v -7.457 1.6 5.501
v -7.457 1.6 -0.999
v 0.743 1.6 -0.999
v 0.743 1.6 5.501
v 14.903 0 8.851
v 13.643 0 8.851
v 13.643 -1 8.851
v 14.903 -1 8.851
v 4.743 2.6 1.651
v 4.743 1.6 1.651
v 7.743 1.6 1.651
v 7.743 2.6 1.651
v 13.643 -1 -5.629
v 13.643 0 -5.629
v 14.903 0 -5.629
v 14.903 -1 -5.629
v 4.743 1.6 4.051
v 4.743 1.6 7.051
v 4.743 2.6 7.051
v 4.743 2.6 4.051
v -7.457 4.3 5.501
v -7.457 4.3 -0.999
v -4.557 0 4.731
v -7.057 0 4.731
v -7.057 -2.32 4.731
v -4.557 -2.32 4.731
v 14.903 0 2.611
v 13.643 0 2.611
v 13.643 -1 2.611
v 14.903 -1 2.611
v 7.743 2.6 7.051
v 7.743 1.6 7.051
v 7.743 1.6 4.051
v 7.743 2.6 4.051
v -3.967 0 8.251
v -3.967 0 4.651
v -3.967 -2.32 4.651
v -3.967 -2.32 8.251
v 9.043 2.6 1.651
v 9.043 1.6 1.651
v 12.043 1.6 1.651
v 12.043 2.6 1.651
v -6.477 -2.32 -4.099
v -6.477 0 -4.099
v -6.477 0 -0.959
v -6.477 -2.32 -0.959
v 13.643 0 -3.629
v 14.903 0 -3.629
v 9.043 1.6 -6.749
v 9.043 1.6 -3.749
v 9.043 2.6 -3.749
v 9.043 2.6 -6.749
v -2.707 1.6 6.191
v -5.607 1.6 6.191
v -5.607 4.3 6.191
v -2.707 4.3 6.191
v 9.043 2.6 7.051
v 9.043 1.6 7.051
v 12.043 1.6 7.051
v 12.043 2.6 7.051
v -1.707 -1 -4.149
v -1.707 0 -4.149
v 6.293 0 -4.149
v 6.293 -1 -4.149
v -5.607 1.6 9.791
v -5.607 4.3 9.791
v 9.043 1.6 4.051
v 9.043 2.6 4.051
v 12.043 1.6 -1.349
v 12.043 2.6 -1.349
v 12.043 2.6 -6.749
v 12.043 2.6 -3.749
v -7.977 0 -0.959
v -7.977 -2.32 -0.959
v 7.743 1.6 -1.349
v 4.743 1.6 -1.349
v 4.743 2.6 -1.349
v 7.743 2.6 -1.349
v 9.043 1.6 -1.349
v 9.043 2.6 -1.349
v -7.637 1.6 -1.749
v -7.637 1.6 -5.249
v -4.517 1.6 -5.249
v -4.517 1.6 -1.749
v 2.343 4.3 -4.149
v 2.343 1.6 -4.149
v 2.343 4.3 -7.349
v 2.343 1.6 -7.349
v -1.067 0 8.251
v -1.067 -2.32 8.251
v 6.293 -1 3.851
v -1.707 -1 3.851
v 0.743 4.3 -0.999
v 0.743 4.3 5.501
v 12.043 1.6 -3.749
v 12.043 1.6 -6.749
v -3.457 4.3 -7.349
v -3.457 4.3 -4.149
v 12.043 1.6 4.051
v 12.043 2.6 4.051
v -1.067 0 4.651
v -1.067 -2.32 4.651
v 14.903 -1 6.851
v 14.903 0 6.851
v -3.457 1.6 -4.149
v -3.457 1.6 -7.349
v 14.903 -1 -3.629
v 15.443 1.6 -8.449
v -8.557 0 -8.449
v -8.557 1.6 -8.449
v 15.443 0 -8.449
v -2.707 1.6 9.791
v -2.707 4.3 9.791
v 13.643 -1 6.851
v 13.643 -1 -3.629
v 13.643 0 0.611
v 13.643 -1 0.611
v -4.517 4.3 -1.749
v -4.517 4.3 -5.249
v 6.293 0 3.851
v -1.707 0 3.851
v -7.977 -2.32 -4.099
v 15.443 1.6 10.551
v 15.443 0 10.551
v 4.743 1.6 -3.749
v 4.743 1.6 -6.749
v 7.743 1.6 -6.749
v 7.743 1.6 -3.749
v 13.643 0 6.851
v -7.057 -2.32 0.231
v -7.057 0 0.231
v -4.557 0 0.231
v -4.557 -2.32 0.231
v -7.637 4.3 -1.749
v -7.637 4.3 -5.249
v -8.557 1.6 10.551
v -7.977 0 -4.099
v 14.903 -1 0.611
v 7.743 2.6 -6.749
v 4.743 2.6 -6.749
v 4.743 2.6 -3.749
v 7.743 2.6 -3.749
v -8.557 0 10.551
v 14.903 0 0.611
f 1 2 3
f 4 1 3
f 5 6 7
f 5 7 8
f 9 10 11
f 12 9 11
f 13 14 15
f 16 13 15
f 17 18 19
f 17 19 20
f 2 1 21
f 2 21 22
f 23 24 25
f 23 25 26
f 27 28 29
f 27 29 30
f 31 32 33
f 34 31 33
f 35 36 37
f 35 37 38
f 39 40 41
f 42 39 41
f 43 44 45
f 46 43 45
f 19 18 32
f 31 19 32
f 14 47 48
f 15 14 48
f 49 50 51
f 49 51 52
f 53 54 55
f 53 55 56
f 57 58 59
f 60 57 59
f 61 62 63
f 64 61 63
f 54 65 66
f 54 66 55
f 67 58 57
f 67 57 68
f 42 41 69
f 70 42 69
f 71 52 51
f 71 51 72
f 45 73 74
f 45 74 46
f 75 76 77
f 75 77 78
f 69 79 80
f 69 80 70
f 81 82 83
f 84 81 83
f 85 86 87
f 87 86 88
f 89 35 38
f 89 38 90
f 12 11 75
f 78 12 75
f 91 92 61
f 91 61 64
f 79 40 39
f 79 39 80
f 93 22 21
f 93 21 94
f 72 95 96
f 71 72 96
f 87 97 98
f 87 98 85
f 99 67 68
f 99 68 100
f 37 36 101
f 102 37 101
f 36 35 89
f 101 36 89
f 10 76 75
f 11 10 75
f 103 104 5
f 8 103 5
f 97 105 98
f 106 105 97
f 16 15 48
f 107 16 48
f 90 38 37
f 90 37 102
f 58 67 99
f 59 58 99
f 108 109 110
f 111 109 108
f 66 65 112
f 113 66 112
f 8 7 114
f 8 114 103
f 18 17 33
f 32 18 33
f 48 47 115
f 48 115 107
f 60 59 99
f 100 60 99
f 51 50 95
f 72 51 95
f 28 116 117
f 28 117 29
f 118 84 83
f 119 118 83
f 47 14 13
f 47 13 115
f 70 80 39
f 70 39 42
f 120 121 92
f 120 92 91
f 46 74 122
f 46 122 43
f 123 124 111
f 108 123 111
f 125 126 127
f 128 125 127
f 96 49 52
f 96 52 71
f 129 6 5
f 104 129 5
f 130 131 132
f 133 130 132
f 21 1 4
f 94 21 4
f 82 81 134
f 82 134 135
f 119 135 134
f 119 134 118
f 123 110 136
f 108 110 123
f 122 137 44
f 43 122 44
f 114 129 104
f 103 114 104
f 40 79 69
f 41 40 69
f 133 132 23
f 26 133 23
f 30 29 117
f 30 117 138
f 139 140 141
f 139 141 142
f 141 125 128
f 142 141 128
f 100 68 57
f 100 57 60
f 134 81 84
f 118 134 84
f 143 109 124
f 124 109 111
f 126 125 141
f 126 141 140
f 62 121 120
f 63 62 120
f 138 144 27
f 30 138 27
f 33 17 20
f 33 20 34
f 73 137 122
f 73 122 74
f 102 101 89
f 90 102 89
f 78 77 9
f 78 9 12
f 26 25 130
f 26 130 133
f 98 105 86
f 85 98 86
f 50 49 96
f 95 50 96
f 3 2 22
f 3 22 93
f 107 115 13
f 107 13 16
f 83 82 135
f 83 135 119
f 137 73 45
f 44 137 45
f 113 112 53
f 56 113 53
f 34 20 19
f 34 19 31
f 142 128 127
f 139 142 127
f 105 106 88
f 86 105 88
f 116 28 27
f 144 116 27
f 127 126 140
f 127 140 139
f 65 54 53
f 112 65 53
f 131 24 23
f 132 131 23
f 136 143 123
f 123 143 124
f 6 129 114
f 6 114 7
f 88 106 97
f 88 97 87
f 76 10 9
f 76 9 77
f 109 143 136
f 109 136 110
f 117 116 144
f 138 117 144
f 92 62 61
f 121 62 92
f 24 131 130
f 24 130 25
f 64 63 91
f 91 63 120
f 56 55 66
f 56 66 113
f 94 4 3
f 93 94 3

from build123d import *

# Parameters (mm, degrees)
SKETCH1_W             = 24
SKETCH1_H             = 19
BOSS_EXTRUDE1_DEPTH   = 1.6
SKETCH2_W             = 8.2
SKETCH2_H             = 6.5
BOSS_EXTRUDE2_DEPTH   = 2.7
SKETCH2_W_2           = 2.9
SKETCH2_H_2           = 3.6
BOSS_EXTRUDE2_2_DEPTH = 2.7
SKETCH2_W_3           = 5.8
SKETCH2_H_3           = 3.2
BOSS_EXTRUDE2_3_DEPTH = 2.7
SKETCH2_W_4           = 3.12
SKETCH2_H_4           = 3.5
BOSS_EXTRUDE2_4_DEPTH = 2.7
SKETCH3_W             = 3
SKETCH3_H             = 3
BOSS_EXTRUDE3_DEPTH   = 1
BOSS_EXTRUDE3_2_DEPTH = 1
BOSS_EXTRUDE3_3_DEPTH = 1
BOSS_EXTRUDE3_4_DEPTH = 1
BOSS_EXTRUDE3_5_DEPTH = 1
BOSS_EXTRUDE3_6_DEPTH = 1
SKETCH4_W             = 2.9
SKETCH4_H             = 3.6
BOSS_EXTRUDE4_DEPTH   = 2.32
SKETCH4_W_2           = 2.5
SKETCH4_H_2           = 4.5
BOSS_EXTRUDE4_2_DEPTH = 2.32
SKETCH4_W_3           = 1.5
SKETCH4_H_3           = 3.14
BOSS_EXTRUDE4_3_DEPTH = 2.32
SKETCH5_W             = 8
SKETCH5_H             = 8
BOSS_EXTRUDE5_DEPTH   = 1
SKETCH5_W_2           = 1.26
SKETCH5_H_2           = 2
BOSS_EXTRUDE5_2_DEPTH = 1
BOSS_EXTRUDE5_3_DEPTH = 1
BOSS_EXTRUDE5_4_DEPTH = 1


with BuildPart() as part:
    # Sketch1 → Boss-Extrude1 (new body)
    with BuildSketch(Plane(origin=(0, 0, 0), x_dir=(1, 0, 0), z_dir=(0, 1, 0))):
        with Locations((3.442553191, -1.05106383)):
            Rectangle(SKETCH1_W, SKETCH1_H)
    extrude(amount=BOSS_EXTRUDE1_DEPTH)


with BuildPart() as body_2:
    # Sketch2 → Boss-Extrude2 (new body)
    with BuildSketch(Plane(origin=(0, 1.6, 0), x_dir=(1, 0, 0), z_dir=(0, 1, 0))):
        with Locations((-3.357446809, -2.25106383)):
            Rectangle(SKETCH2_W, SKETCH2_H)
    extrude(amount=BOSS_EXTRUDE2_DEPTH)


with BuildPart() as body_3:
    # Sketch2 → Boss-Extrude2 2 (new body)
    with BuildSketch(Plane(origin=(0, 1.6, 0), x_dir=(1, 0, 0), z_dir=(0, 1, 0))):
        with Locations((-4.157446809, -7.99106383)):
            Rectangle(SKETCH2_W_2, SKETCH2_H_2)
    extrude(amount=BOSS_EXTRUDE2_2_DEPTH)


with BuildPart() as body_4:
    # Sketch2 → Boss-Extrude2 3 (new body)
    with BuildSketch(Plane(origin=(0, 1.6, 0), x_dir=(1, 0, 0), z_dir=(0, 1, 0))):
        with Locations((-0.557446809, 5.74893617)):
            Rectangle(SKETCH2_W_3, SKETCH2_H_3)
    extrude(amount=BOSS_EXTRUDE2_3_DEPTH)


with BuildPart() as body_5:
    # Sketch2 → Boss-Extrude2 4 (new body)
    with BuildSketch(Plane(origin=(0, 1.6, 0), x_dir=(1, 0, 0), z_dir=(0, 1, 0))):
        with Locations((-6.077446809, 3.49893617)):
            Rectangle(SKETCH2_W_4, SKETCH2_H_4)
    extrude(amount=BOSS_EXTRUDE2_4_DEPTH)


with BuildPart() as body_6:
    # Sketch3 → Boss-Extrude3 (new body)
    with BuildSketch(Plane(origin=(0, 1.6, 0), x_dir=(1, 0, 0), z_dir=(0, 1, 0))):
        with Locations((6.242553191, 5.24893617)):
            Rectangle(SKETCH3_W, SKETCH3_H)
    extrude(amount=BOSS_EXTRUDE3_DEPTH)


with BuildPart() as body_7:
    # Sketch3 → Boss-Extrude3 2 (new body)
    with BuildSketch(Plane(origin=(0, 1.6, 0), x_dir=(1, 0, 0), z_dir=(0, 1, 0))):
        with Locations((10.542553191, 5.24893617)):
            Rectangle(SKETCH3_W, SKETCH3_H)
    extrude(amount=BOSS_EXTRUDE3_2_DEPTH)


with BuildPart() as body_8:
    # Sketch3 → Boss-Extrude3 3 (new body)
    with BuildSketch(Plane(origin=(0, 1.6, 0), x_dir=(1, 0, 0), z_dir=(0, 1, 0))):
        with Locations((6.242553191, -0.15106383)):
            Rectangle(SKETCH3_W, SKETCH3_H)
    extrude(amount=BOSS_EXTRUDE3_3_DEPTH)


with BuildPart() as body_9:
    # Sketch3 → Boss-Extrude3 4 (new body)
    with BuildSketch(Plane(origin=(0, 1.6, 0), x_dir=(1, 0, 0), z_dir=(0, 1, 0))):
        with Locations((10.542553191, -0.15106383)):
            Rectangle(SKETCH3_W, SKETCH3_H)
    extrude(amount=BOSS_EXTRUDE3_4_DEPTH)


with BuildPart() as body_10:
    # Sketch3 → Boss-Extrude3 5 (new body)
    with BuildSketch(Plane(origin=(0, 1.6, 0), x_dir=(1, 0, 0), z_dir=(0, 1, 0))):
        with Locations((6.242553191, -5.55106383)):
            Rectangle(SKETCH3_W, SKETCH3_H)
    extrude(amount=BOSS_EXTRUDE3_5_DEPTH)


with BuildPart() as body_11:
    # Sketch3 → Boss-Extrude3 6 (new body)
    with BuildSketch(Plane(origin=(0, 1.6, 0), x_dir=(1, 0, 0), z_dir=(0, 1, 0))):
        with Locations((10.542553191, -5.55106383)):
            Rectangle(SKETCH3_W, SKETCH3_H)
    extrude(amount=BOSS_EXTRUDE3_6_DEPTH)


with BuildPart() as body_12:
    # Sketch4 → Boss-Extrude4 (new body)
    with BuildSketch(Plane.XZ):
        with Locations((-2.517446809, 6.45106383)):
            Rectangle(SKETCH4_W, SKETCH4_H)
    extrude(amount=BOSS_EXTRUDE4_DEPTH)


with BuildPart() as body_13:
    # Sketch4 → Boss-Extrude4 2 (new body)
    with BuildSketch(Plane.XZ):
        with Locations((-5.807446809, 2.48106383)):
            Rectangle(SKETCH4_W_2, SKETCH4_H_2)
    extrude(amount=BOSS_EXTRUDE4_2_DEPTH)


with BuildPart() as body_14:
    # Sketch4 → Boss-Extrude4 3 (new body)
    with BuildSketch(Plane.XZ):
        with Locations((-7.227446809, -2.52893617)):
            Rectangle(SKETCH4_W_3, SKETCH4_H_3)
    extrude(amount=BOSS_EXTRUDE4_3_DEPTH)


with BuildPart() as body_15:
    # Sketch5 → Boss-Extrude5 (new body)
    with BuildSketch(Plane.XZ):
        with Locations((2.292553191, -0.14893617)):
            Rectangle(SKETCH5_W, SKETCH5_H)
    extrude(amount=BOSS_EXTRUDE5_DEPTH)


with BuildPart() as body_16:
    # Sketch5 → Boss-Extrude5 2 (new body)
    with BuildSketch(Plane.XZ):
        with Locations((14.272553191, 7.85106383)):
            Rectangle(SKETCH5_W_2, SKETCH5_H_2)
    extrude(amount=BOSS_EXTRUDE5_2_DEPTH)


with BuildPart() as body_17:
    # Sketch5 → Boss-Extrude5 3 (new body)
    with BuildSketch(Plane.XZ):
        with Locations((14.272553191, 1.61106383)):
            Rectangle(SKETCH5_W_2, SKETCH5_H_2)
    extrude(amount=BOSS_EXTRUDE5_3_DEPTH)


with BuildPart() as body_18:
    # Sketch5 → Boss-Extrude5 4 (new body)
    with BuildSketch(Plane.XZ):
        with Locations((14.272553191, -4.62893617)):
            Rectangle(SKETCH5_W_2, SKETCH5_H_2)
    extrude(amount=BOSS_EXTRUDE5_4_DEPTH)


solid = Compound([part.part, body_2.part, body_3.part, body_4.part, body_5.part, body_6.part, body_7.part, body_8.part, body_9.part, body_10.part, body_11.part, body_12.part, body_13.part, body_14.part, body_15.part, body_16.part, body_17.part, body_18.part])
